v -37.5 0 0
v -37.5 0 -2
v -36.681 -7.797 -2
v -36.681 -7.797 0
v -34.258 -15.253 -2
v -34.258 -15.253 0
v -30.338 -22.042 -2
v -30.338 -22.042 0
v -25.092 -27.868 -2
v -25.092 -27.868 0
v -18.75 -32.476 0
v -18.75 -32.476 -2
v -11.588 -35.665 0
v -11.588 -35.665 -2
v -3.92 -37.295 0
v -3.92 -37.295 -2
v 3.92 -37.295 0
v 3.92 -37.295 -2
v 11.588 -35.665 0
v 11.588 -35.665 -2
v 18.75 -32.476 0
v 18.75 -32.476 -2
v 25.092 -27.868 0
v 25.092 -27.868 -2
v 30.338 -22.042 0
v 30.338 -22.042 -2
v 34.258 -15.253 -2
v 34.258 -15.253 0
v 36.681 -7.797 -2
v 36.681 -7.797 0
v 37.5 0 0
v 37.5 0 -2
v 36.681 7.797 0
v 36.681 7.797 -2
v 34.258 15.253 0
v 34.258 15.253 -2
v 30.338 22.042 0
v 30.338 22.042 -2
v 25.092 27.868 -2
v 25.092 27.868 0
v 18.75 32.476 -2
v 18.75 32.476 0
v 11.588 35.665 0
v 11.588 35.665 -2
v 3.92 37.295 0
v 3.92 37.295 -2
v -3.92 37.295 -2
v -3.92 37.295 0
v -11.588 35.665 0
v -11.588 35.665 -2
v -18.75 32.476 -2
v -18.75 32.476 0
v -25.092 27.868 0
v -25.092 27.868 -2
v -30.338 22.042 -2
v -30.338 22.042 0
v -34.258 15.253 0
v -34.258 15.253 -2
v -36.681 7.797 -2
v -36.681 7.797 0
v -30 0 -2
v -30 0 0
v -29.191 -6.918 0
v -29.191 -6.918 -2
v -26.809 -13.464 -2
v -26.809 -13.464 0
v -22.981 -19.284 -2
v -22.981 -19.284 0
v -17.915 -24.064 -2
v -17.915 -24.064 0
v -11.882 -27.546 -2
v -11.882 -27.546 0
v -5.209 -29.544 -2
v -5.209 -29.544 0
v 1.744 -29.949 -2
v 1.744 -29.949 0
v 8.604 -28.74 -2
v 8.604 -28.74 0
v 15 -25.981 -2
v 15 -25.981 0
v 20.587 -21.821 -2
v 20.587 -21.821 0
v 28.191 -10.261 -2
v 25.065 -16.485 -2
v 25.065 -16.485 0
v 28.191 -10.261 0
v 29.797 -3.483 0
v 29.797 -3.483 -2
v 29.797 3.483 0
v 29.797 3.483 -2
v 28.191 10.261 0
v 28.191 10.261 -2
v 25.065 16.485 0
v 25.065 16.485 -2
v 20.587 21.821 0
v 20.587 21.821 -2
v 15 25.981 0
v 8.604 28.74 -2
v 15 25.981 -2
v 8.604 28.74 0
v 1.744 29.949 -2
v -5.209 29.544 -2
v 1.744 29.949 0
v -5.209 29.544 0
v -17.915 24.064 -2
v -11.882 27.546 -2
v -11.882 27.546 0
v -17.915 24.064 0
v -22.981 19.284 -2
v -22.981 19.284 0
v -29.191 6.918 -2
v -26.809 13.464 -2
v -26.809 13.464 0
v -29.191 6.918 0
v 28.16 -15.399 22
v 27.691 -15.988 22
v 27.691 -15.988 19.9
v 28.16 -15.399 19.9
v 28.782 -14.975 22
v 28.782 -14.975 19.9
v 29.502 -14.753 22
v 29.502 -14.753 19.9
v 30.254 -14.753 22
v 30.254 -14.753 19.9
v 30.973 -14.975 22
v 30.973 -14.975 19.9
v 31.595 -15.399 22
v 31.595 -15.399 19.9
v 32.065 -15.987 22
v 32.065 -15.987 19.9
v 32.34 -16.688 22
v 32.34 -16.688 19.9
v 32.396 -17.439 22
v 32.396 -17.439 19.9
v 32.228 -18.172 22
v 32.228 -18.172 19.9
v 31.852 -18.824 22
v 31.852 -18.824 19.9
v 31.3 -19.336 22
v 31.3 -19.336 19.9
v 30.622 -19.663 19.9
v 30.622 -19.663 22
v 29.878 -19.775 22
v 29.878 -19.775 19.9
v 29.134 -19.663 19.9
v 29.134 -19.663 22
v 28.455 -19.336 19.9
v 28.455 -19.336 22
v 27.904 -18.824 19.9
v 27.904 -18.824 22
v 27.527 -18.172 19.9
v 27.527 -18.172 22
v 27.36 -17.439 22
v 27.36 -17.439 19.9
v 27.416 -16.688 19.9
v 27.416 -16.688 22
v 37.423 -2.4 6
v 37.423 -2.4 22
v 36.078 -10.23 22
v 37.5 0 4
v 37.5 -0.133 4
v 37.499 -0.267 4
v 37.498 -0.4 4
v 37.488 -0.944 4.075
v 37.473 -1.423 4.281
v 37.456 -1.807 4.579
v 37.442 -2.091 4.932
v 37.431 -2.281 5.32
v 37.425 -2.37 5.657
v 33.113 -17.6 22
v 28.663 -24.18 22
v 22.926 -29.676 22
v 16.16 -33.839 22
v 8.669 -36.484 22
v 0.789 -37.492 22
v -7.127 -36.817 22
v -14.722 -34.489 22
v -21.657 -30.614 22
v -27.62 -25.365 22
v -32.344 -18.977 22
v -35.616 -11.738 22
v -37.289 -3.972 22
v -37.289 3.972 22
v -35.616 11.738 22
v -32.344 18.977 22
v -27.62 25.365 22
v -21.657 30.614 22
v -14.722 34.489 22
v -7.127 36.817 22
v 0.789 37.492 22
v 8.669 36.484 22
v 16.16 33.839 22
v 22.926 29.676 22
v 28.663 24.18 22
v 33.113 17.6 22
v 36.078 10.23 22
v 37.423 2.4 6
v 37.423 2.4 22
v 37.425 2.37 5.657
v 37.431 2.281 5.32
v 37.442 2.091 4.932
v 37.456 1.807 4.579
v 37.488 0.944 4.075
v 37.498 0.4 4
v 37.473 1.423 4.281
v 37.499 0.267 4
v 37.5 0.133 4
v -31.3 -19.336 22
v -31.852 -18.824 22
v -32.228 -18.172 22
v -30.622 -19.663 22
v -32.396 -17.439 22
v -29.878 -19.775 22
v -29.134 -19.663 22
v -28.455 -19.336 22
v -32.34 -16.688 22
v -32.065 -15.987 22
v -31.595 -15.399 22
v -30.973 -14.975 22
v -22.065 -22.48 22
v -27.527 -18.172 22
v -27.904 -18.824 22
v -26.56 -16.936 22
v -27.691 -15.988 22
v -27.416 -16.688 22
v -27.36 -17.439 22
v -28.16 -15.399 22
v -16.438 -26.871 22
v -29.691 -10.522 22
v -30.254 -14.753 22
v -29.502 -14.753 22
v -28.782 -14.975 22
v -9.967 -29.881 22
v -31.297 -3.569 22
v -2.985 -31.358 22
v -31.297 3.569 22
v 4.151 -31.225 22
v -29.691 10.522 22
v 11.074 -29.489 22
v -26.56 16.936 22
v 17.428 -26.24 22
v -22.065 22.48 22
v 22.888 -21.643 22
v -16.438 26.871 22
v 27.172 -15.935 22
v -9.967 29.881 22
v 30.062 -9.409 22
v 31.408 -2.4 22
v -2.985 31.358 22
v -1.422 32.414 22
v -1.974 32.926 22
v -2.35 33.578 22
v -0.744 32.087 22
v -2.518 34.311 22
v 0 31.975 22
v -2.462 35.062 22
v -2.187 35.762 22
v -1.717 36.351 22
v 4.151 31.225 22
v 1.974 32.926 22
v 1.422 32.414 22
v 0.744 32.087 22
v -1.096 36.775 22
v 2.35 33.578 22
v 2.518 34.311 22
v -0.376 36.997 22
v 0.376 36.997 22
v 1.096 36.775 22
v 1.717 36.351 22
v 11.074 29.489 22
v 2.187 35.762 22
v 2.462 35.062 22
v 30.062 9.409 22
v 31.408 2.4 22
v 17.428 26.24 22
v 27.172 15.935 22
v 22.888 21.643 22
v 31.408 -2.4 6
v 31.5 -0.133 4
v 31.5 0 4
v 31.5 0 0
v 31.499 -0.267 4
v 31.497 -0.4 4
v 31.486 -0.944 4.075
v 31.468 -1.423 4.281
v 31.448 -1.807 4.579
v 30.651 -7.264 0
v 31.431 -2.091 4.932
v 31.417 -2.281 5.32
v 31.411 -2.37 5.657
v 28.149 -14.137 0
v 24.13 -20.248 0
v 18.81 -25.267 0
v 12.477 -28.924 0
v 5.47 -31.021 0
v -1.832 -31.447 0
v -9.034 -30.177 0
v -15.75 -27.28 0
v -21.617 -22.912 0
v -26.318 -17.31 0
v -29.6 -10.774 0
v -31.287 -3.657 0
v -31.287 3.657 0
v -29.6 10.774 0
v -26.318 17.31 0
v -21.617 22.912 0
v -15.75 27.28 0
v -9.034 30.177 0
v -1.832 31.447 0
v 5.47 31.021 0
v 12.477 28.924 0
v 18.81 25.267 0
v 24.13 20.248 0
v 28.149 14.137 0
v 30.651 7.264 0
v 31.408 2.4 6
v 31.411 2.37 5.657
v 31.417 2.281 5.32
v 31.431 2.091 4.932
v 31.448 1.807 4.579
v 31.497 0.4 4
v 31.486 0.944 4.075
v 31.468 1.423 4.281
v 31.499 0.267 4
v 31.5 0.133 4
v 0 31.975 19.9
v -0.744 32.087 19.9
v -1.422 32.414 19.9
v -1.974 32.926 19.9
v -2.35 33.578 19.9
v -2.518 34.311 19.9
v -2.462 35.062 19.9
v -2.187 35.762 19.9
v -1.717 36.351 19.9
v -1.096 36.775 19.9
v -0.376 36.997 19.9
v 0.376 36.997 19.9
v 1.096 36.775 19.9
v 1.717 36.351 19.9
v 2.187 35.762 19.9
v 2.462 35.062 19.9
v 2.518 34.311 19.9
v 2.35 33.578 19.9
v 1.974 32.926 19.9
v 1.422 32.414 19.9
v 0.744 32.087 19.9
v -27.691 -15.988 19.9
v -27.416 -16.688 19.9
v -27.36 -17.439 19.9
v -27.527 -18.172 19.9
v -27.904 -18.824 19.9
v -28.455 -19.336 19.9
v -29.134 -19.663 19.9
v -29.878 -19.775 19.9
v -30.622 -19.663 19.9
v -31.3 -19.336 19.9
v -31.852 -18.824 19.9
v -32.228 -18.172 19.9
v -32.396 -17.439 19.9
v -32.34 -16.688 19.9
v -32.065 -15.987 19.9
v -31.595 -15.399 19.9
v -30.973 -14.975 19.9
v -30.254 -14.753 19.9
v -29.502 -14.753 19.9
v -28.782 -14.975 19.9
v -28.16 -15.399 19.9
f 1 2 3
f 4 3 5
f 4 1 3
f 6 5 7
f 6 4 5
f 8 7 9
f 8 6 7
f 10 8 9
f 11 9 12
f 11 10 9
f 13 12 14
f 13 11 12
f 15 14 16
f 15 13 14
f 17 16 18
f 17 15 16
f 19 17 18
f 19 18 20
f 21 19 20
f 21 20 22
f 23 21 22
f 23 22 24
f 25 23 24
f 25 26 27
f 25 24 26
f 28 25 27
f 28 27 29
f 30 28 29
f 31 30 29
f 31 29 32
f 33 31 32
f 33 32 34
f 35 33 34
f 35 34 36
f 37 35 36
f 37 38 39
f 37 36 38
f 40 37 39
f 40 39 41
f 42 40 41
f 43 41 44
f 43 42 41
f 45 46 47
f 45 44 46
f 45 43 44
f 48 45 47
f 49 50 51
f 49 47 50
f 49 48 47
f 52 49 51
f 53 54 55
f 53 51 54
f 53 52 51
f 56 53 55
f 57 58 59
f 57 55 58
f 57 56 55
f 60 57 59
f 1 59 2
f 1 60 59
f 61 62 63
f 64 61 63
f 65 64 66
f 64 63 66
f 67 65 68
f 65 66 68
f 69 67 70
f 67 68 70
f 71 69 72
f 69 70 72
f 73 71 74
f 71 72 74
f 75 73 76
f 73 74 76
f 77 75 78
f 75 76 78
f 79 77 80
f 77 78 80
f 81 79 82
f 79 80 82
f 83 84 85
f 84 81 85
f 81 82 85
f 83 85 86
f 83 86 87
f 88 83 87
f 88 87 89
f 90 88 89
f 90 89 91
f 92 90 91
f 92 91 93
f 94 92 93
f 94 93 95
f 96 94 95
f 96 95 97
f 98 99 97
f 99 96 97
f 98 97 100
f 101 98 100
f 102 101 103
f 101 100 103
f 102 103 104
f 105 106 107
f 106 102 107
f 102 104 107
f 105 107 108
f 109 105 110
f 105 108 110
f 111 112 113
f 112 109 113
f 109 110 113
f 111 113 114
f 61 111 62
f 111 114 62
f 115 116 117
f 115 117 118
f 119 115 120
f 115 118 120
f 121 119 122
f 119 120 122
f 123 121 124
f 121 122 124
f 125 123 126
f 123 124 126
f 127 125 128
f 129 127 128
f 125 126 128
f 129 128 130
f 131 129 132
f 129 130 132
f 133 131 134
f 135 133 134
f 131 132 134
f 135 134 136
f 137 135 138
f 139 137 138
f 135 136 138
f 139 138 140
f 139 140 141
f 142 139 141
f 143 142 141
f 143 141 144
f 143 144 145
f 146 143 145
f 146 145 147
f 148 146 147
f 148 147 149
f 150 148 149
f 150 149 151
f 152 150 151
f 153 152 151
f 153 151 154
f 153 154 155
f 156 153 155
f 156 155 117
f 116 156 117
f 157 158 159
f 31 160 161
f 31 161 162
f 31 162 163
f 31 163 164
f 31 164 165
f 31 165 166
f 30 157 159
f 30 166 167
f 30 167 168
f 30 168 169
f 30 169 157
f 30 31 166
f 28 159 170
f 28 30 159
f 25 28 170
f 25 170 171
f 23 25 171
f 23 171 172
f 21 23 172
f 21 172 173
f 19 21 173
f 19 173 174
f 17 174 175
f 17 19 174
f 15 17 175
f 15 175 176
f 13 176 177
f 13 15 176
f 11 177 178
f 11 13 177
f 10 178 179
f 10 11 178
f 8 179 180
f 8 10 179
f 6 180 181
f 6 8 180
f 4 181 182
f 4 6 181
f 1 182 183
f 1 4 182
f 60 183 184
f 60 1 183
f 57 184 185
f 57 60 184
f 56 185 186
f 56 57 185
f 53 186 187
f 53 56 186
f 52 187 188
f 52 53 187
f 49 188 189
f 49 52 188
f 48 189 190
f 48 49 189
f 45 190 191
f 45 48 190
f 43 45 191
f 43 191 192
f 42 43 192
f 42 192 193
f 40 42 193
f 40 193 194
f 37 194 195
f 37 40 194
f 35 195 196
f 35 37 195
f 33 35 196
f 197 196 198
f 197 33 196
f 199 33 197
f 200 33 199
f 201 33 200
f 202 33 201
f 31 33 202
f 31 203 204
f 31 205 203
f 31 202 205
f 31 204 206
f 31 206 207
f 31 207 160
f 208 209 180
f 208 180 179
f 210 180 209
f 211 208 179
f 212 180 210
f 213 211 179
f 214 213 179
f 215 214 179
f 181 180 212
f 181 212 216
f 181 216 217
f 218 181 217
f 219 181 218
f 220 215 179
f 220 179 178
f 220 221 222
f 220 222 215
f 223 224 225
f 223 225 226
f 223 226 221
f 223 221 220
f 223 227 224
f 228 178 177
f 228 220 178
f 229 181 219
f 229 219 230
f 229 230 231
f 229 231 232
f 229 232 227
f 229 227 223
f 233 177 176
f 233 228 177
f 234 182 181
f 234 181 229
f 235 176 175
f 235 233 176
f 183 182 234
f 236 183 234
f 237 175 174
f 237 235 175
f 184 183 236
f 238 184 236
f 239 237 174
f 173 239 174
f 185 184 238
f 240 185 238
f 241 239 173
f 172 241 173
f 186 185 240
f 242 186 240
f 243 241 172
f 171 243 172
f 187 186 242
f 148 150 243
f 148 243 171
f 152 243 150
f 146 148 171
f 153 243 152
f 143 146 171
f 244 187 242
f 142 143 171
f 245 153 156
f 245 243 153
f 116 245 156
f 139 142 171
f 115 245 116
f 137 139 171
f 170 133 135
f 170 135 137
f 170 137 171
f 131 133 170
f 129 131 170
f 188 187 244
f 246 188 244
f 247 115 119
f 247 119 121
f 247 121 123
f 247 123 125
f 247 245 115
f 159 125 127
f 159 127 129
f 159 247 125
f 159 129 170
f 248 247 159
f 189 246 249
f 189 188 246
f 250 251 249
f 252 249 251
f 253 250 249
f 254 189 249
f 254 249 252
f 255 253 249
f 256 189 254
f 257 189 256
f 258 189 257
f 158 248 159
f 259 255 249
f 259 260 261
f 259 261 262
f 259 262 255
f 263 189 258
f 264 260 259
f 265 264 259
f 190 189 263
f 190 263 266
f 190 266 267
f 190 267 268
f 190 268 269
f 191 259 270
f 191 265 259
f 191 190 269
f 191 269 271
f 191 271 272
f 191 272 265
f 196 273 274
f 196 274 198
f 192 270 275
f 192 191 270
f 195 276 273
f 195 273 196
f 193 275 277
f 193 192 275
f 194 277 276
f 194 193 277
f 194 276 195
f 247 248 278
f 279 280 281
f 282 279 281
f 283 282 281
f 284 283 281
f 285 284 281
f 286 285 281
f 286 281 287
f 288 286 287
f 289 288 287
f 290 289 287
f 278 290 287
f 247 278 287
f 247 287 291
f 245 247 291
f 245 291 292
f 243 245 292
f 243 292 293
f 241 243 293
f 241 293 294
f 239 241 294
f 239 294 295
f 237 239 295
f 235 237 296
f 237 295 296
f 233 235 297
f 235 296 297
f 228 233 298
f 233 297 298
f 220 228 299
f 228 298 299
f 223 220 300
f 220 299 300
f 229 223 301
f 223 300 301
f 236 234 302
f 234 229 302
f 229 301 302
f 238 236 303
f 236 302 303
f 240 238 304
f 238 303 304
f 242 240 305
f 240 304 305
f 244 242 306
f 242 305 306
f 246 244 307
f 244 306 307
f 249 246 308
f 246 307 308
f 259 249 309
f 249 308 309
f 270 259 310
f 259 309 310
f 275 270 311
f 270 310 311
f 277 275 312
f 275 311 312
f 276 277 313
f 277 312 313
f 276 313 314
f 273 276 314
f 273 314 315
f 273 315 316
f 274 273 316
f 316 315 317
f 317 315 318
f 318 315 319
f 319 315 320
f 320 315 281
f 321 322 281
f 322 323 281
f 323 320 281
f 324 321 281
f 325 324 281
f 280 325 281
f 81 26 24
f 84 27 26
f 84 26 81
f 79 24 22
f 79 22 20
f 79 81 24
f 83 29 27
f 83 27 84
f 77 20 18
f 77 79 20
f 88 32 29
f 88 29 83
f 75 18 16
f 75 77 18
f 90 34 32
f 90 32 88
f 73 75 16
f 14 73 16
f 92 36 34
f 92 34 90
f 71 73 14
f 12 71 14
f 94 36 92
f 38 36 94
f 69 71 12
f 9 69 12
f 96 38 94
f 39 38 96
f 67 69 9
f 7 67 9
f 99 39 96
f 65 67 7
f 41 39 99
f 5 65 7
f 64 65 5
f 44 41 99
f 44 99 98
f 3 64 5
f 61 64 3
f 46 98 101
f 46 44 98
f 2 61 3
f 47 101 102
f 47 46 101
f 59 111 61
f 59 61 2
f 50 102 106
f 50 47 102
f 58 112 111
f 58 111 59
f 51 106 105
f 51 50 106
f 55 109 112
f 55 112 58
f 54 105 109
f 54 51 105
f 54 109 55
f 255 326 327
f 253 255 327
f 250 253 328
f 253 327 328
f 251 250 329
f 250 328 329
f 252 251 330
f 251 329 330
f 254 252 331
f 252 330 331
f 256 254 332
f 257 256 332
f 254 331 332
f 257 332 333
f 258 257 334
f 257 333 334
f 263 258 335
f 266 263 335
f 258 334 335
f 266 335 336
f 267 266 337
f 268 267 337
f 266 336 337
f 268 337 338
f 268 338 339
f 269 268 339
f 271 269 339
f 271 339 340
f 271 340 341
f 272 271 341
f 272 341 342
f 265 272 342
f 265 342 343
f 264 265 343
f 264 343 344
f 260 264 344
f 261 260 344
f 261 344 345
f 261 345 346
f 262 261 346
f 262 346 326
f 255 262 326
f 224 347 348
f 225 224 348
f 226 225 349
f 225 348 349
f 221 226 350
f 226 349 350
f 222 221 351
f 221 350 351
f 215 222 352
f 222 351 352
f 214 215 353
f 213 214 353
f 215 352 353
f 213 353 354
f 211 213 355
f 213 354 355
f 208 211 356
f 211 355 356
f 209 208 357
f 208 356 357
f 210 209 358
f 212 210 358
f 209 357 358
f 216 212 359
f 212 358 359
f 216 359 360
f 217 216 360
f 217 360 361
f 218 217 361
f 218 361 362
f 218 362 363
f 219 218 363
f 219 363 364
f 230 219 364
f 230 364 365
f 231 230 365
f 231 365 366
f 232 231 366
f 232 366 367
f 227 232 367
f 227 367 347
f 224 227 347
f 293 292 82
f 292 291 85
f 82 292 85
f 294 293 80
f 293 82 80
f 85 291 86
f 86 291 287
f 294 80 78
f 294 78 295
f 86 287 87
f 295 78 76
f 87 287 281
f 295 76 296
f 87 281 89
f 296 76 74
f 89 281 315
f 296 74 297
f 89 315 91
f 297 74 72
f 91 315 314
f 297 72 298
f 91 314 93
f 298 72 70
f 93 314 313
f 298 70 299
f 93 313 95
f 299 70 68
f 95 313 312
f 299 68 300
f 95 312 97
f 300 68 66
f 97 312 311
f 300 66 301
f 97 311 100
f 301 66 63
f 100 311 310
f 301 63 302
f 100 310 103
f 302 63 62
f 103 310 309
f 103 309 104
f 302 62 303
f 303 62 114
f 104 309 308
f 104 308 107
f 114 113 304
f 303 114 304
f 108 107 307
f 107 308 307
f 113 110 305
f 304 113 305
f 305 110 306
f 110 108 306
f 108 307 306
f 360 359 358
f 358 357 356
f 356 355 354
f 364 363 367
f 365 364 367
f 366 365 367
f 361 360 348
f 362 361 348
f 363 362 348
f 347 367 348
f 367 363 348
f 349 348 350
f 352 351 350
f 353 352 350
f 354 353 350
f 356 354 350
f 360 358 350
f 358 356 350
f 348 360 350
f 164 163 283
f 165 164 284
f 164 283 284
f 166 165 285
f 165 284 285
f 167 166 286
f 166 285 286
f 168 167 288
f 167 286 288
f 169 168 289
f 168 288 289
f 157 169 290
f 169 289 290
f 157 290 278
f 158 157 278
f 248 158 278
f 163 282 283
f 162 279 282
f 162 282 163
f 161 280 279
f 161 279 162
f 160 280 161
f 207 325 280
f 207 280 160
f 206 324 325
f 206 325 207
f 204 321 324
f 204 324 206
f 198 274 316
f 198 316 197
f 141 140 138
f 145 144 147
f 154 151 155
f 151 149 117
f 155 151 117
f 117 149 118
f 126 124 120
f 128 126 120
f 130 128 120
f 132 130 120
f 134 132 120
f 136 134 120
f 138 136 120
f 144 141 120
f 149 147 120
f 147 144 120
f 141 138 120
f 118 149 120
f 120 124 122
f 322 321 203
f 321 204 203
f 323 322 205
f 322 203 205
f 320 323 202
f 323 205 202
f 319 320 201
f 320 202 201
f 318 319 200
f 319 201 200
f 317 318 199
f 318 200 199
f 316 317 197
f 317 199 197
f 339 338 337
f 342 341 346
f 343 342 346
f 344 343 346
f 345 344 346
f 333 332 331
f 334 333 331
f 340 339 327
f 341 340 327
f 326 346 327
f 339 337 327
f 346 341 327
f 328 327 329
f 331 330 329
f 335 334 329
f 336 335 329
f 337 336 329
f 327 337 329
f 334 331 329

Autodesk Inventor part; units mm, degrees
ref_plane "YZ Plane" through (0, 0, 0) normal (1, 0, 0) x (0, 1, 0)
ref_plane "XZ Plane" through (0, 0, 0) normal (0, 1, 0) x (-1, 0, 0)
ref_plane "XY Plane" through (0, 0, 0) normal (0, 0, 1) x (1, 0, 0)
sketch "Skizze1" plane through (0, 0, 0) normal (0, 0, 1) x (1, 0, 0)
  circle A0 centre (0, 0) radius 31.5
  circle A1 centre (0, 0) radius 37.5
  dimension "d0" = 63
  dimension "d1" = 75
extrude "Extrusion1" add sketch "Skizze1" along normal blind 22
sketch "Skizze2" plane through (0, 0, 0) normal (0, 0, -1) x (-1, 0, 0)
  circle A0 centre (0, 0) radius 37.5
  circle A1 centre (0, 0) radius 30
  dimension "d4" = 75
  dimension "d5" = 60
extrude "Extrusion2" add sketch "Skizze2" along normal blind 2
sketch "Skizze3" plane through (0, 0, 22) normal (0, 0, 1) x (1, 0, 0)
  point P0 (0, 0)
  point P1 (0, 34.5)
  dimension "d8" = 34.5
hole "Bohrung1" at (0, 34.5, 22) direction (0, 0, -1) diameter 5.05 depth 2.1
pattern_circular "Runde Anordnung1" count 3 over 360 about axis through (0, 0, 0) along (0, 0, 1) of "Bohrung1"
sketch "Skizze4" plane through (0, 0, 22) normal (0, 0, 1) x (1, 0, 0)
  line L0 (14.3077, 2.4) -> (40, 2.4)
  line L1 (40, 2.4) -> (40, -2.4)
  line L2 (40, -2.4) -> (14.3077, -2.4)
  line L3 (14.3077, -2.4) -> (14.3077, 2.4)
  point P0 (0, 0)
  dimension "d19" = 4.8
  dimension "d20" = 2.4
  dimension "d21" = 40
extrude "Extrusion3" cut sketch "Skizze4" against normal blind 18
fillet "Rundung1" radius 2 2 edges at (34.4158, 2.4, 4) (34.4158, -2.4, 4)
sketch "Skizze5" plane through (0, 0, 22) normal (0, 0, 1) x (1, 0, 0)
  point P0 (0, 0)
equation "\"d20\" = 0.5 * d19"
properties part number "Sensor63Deckel"
